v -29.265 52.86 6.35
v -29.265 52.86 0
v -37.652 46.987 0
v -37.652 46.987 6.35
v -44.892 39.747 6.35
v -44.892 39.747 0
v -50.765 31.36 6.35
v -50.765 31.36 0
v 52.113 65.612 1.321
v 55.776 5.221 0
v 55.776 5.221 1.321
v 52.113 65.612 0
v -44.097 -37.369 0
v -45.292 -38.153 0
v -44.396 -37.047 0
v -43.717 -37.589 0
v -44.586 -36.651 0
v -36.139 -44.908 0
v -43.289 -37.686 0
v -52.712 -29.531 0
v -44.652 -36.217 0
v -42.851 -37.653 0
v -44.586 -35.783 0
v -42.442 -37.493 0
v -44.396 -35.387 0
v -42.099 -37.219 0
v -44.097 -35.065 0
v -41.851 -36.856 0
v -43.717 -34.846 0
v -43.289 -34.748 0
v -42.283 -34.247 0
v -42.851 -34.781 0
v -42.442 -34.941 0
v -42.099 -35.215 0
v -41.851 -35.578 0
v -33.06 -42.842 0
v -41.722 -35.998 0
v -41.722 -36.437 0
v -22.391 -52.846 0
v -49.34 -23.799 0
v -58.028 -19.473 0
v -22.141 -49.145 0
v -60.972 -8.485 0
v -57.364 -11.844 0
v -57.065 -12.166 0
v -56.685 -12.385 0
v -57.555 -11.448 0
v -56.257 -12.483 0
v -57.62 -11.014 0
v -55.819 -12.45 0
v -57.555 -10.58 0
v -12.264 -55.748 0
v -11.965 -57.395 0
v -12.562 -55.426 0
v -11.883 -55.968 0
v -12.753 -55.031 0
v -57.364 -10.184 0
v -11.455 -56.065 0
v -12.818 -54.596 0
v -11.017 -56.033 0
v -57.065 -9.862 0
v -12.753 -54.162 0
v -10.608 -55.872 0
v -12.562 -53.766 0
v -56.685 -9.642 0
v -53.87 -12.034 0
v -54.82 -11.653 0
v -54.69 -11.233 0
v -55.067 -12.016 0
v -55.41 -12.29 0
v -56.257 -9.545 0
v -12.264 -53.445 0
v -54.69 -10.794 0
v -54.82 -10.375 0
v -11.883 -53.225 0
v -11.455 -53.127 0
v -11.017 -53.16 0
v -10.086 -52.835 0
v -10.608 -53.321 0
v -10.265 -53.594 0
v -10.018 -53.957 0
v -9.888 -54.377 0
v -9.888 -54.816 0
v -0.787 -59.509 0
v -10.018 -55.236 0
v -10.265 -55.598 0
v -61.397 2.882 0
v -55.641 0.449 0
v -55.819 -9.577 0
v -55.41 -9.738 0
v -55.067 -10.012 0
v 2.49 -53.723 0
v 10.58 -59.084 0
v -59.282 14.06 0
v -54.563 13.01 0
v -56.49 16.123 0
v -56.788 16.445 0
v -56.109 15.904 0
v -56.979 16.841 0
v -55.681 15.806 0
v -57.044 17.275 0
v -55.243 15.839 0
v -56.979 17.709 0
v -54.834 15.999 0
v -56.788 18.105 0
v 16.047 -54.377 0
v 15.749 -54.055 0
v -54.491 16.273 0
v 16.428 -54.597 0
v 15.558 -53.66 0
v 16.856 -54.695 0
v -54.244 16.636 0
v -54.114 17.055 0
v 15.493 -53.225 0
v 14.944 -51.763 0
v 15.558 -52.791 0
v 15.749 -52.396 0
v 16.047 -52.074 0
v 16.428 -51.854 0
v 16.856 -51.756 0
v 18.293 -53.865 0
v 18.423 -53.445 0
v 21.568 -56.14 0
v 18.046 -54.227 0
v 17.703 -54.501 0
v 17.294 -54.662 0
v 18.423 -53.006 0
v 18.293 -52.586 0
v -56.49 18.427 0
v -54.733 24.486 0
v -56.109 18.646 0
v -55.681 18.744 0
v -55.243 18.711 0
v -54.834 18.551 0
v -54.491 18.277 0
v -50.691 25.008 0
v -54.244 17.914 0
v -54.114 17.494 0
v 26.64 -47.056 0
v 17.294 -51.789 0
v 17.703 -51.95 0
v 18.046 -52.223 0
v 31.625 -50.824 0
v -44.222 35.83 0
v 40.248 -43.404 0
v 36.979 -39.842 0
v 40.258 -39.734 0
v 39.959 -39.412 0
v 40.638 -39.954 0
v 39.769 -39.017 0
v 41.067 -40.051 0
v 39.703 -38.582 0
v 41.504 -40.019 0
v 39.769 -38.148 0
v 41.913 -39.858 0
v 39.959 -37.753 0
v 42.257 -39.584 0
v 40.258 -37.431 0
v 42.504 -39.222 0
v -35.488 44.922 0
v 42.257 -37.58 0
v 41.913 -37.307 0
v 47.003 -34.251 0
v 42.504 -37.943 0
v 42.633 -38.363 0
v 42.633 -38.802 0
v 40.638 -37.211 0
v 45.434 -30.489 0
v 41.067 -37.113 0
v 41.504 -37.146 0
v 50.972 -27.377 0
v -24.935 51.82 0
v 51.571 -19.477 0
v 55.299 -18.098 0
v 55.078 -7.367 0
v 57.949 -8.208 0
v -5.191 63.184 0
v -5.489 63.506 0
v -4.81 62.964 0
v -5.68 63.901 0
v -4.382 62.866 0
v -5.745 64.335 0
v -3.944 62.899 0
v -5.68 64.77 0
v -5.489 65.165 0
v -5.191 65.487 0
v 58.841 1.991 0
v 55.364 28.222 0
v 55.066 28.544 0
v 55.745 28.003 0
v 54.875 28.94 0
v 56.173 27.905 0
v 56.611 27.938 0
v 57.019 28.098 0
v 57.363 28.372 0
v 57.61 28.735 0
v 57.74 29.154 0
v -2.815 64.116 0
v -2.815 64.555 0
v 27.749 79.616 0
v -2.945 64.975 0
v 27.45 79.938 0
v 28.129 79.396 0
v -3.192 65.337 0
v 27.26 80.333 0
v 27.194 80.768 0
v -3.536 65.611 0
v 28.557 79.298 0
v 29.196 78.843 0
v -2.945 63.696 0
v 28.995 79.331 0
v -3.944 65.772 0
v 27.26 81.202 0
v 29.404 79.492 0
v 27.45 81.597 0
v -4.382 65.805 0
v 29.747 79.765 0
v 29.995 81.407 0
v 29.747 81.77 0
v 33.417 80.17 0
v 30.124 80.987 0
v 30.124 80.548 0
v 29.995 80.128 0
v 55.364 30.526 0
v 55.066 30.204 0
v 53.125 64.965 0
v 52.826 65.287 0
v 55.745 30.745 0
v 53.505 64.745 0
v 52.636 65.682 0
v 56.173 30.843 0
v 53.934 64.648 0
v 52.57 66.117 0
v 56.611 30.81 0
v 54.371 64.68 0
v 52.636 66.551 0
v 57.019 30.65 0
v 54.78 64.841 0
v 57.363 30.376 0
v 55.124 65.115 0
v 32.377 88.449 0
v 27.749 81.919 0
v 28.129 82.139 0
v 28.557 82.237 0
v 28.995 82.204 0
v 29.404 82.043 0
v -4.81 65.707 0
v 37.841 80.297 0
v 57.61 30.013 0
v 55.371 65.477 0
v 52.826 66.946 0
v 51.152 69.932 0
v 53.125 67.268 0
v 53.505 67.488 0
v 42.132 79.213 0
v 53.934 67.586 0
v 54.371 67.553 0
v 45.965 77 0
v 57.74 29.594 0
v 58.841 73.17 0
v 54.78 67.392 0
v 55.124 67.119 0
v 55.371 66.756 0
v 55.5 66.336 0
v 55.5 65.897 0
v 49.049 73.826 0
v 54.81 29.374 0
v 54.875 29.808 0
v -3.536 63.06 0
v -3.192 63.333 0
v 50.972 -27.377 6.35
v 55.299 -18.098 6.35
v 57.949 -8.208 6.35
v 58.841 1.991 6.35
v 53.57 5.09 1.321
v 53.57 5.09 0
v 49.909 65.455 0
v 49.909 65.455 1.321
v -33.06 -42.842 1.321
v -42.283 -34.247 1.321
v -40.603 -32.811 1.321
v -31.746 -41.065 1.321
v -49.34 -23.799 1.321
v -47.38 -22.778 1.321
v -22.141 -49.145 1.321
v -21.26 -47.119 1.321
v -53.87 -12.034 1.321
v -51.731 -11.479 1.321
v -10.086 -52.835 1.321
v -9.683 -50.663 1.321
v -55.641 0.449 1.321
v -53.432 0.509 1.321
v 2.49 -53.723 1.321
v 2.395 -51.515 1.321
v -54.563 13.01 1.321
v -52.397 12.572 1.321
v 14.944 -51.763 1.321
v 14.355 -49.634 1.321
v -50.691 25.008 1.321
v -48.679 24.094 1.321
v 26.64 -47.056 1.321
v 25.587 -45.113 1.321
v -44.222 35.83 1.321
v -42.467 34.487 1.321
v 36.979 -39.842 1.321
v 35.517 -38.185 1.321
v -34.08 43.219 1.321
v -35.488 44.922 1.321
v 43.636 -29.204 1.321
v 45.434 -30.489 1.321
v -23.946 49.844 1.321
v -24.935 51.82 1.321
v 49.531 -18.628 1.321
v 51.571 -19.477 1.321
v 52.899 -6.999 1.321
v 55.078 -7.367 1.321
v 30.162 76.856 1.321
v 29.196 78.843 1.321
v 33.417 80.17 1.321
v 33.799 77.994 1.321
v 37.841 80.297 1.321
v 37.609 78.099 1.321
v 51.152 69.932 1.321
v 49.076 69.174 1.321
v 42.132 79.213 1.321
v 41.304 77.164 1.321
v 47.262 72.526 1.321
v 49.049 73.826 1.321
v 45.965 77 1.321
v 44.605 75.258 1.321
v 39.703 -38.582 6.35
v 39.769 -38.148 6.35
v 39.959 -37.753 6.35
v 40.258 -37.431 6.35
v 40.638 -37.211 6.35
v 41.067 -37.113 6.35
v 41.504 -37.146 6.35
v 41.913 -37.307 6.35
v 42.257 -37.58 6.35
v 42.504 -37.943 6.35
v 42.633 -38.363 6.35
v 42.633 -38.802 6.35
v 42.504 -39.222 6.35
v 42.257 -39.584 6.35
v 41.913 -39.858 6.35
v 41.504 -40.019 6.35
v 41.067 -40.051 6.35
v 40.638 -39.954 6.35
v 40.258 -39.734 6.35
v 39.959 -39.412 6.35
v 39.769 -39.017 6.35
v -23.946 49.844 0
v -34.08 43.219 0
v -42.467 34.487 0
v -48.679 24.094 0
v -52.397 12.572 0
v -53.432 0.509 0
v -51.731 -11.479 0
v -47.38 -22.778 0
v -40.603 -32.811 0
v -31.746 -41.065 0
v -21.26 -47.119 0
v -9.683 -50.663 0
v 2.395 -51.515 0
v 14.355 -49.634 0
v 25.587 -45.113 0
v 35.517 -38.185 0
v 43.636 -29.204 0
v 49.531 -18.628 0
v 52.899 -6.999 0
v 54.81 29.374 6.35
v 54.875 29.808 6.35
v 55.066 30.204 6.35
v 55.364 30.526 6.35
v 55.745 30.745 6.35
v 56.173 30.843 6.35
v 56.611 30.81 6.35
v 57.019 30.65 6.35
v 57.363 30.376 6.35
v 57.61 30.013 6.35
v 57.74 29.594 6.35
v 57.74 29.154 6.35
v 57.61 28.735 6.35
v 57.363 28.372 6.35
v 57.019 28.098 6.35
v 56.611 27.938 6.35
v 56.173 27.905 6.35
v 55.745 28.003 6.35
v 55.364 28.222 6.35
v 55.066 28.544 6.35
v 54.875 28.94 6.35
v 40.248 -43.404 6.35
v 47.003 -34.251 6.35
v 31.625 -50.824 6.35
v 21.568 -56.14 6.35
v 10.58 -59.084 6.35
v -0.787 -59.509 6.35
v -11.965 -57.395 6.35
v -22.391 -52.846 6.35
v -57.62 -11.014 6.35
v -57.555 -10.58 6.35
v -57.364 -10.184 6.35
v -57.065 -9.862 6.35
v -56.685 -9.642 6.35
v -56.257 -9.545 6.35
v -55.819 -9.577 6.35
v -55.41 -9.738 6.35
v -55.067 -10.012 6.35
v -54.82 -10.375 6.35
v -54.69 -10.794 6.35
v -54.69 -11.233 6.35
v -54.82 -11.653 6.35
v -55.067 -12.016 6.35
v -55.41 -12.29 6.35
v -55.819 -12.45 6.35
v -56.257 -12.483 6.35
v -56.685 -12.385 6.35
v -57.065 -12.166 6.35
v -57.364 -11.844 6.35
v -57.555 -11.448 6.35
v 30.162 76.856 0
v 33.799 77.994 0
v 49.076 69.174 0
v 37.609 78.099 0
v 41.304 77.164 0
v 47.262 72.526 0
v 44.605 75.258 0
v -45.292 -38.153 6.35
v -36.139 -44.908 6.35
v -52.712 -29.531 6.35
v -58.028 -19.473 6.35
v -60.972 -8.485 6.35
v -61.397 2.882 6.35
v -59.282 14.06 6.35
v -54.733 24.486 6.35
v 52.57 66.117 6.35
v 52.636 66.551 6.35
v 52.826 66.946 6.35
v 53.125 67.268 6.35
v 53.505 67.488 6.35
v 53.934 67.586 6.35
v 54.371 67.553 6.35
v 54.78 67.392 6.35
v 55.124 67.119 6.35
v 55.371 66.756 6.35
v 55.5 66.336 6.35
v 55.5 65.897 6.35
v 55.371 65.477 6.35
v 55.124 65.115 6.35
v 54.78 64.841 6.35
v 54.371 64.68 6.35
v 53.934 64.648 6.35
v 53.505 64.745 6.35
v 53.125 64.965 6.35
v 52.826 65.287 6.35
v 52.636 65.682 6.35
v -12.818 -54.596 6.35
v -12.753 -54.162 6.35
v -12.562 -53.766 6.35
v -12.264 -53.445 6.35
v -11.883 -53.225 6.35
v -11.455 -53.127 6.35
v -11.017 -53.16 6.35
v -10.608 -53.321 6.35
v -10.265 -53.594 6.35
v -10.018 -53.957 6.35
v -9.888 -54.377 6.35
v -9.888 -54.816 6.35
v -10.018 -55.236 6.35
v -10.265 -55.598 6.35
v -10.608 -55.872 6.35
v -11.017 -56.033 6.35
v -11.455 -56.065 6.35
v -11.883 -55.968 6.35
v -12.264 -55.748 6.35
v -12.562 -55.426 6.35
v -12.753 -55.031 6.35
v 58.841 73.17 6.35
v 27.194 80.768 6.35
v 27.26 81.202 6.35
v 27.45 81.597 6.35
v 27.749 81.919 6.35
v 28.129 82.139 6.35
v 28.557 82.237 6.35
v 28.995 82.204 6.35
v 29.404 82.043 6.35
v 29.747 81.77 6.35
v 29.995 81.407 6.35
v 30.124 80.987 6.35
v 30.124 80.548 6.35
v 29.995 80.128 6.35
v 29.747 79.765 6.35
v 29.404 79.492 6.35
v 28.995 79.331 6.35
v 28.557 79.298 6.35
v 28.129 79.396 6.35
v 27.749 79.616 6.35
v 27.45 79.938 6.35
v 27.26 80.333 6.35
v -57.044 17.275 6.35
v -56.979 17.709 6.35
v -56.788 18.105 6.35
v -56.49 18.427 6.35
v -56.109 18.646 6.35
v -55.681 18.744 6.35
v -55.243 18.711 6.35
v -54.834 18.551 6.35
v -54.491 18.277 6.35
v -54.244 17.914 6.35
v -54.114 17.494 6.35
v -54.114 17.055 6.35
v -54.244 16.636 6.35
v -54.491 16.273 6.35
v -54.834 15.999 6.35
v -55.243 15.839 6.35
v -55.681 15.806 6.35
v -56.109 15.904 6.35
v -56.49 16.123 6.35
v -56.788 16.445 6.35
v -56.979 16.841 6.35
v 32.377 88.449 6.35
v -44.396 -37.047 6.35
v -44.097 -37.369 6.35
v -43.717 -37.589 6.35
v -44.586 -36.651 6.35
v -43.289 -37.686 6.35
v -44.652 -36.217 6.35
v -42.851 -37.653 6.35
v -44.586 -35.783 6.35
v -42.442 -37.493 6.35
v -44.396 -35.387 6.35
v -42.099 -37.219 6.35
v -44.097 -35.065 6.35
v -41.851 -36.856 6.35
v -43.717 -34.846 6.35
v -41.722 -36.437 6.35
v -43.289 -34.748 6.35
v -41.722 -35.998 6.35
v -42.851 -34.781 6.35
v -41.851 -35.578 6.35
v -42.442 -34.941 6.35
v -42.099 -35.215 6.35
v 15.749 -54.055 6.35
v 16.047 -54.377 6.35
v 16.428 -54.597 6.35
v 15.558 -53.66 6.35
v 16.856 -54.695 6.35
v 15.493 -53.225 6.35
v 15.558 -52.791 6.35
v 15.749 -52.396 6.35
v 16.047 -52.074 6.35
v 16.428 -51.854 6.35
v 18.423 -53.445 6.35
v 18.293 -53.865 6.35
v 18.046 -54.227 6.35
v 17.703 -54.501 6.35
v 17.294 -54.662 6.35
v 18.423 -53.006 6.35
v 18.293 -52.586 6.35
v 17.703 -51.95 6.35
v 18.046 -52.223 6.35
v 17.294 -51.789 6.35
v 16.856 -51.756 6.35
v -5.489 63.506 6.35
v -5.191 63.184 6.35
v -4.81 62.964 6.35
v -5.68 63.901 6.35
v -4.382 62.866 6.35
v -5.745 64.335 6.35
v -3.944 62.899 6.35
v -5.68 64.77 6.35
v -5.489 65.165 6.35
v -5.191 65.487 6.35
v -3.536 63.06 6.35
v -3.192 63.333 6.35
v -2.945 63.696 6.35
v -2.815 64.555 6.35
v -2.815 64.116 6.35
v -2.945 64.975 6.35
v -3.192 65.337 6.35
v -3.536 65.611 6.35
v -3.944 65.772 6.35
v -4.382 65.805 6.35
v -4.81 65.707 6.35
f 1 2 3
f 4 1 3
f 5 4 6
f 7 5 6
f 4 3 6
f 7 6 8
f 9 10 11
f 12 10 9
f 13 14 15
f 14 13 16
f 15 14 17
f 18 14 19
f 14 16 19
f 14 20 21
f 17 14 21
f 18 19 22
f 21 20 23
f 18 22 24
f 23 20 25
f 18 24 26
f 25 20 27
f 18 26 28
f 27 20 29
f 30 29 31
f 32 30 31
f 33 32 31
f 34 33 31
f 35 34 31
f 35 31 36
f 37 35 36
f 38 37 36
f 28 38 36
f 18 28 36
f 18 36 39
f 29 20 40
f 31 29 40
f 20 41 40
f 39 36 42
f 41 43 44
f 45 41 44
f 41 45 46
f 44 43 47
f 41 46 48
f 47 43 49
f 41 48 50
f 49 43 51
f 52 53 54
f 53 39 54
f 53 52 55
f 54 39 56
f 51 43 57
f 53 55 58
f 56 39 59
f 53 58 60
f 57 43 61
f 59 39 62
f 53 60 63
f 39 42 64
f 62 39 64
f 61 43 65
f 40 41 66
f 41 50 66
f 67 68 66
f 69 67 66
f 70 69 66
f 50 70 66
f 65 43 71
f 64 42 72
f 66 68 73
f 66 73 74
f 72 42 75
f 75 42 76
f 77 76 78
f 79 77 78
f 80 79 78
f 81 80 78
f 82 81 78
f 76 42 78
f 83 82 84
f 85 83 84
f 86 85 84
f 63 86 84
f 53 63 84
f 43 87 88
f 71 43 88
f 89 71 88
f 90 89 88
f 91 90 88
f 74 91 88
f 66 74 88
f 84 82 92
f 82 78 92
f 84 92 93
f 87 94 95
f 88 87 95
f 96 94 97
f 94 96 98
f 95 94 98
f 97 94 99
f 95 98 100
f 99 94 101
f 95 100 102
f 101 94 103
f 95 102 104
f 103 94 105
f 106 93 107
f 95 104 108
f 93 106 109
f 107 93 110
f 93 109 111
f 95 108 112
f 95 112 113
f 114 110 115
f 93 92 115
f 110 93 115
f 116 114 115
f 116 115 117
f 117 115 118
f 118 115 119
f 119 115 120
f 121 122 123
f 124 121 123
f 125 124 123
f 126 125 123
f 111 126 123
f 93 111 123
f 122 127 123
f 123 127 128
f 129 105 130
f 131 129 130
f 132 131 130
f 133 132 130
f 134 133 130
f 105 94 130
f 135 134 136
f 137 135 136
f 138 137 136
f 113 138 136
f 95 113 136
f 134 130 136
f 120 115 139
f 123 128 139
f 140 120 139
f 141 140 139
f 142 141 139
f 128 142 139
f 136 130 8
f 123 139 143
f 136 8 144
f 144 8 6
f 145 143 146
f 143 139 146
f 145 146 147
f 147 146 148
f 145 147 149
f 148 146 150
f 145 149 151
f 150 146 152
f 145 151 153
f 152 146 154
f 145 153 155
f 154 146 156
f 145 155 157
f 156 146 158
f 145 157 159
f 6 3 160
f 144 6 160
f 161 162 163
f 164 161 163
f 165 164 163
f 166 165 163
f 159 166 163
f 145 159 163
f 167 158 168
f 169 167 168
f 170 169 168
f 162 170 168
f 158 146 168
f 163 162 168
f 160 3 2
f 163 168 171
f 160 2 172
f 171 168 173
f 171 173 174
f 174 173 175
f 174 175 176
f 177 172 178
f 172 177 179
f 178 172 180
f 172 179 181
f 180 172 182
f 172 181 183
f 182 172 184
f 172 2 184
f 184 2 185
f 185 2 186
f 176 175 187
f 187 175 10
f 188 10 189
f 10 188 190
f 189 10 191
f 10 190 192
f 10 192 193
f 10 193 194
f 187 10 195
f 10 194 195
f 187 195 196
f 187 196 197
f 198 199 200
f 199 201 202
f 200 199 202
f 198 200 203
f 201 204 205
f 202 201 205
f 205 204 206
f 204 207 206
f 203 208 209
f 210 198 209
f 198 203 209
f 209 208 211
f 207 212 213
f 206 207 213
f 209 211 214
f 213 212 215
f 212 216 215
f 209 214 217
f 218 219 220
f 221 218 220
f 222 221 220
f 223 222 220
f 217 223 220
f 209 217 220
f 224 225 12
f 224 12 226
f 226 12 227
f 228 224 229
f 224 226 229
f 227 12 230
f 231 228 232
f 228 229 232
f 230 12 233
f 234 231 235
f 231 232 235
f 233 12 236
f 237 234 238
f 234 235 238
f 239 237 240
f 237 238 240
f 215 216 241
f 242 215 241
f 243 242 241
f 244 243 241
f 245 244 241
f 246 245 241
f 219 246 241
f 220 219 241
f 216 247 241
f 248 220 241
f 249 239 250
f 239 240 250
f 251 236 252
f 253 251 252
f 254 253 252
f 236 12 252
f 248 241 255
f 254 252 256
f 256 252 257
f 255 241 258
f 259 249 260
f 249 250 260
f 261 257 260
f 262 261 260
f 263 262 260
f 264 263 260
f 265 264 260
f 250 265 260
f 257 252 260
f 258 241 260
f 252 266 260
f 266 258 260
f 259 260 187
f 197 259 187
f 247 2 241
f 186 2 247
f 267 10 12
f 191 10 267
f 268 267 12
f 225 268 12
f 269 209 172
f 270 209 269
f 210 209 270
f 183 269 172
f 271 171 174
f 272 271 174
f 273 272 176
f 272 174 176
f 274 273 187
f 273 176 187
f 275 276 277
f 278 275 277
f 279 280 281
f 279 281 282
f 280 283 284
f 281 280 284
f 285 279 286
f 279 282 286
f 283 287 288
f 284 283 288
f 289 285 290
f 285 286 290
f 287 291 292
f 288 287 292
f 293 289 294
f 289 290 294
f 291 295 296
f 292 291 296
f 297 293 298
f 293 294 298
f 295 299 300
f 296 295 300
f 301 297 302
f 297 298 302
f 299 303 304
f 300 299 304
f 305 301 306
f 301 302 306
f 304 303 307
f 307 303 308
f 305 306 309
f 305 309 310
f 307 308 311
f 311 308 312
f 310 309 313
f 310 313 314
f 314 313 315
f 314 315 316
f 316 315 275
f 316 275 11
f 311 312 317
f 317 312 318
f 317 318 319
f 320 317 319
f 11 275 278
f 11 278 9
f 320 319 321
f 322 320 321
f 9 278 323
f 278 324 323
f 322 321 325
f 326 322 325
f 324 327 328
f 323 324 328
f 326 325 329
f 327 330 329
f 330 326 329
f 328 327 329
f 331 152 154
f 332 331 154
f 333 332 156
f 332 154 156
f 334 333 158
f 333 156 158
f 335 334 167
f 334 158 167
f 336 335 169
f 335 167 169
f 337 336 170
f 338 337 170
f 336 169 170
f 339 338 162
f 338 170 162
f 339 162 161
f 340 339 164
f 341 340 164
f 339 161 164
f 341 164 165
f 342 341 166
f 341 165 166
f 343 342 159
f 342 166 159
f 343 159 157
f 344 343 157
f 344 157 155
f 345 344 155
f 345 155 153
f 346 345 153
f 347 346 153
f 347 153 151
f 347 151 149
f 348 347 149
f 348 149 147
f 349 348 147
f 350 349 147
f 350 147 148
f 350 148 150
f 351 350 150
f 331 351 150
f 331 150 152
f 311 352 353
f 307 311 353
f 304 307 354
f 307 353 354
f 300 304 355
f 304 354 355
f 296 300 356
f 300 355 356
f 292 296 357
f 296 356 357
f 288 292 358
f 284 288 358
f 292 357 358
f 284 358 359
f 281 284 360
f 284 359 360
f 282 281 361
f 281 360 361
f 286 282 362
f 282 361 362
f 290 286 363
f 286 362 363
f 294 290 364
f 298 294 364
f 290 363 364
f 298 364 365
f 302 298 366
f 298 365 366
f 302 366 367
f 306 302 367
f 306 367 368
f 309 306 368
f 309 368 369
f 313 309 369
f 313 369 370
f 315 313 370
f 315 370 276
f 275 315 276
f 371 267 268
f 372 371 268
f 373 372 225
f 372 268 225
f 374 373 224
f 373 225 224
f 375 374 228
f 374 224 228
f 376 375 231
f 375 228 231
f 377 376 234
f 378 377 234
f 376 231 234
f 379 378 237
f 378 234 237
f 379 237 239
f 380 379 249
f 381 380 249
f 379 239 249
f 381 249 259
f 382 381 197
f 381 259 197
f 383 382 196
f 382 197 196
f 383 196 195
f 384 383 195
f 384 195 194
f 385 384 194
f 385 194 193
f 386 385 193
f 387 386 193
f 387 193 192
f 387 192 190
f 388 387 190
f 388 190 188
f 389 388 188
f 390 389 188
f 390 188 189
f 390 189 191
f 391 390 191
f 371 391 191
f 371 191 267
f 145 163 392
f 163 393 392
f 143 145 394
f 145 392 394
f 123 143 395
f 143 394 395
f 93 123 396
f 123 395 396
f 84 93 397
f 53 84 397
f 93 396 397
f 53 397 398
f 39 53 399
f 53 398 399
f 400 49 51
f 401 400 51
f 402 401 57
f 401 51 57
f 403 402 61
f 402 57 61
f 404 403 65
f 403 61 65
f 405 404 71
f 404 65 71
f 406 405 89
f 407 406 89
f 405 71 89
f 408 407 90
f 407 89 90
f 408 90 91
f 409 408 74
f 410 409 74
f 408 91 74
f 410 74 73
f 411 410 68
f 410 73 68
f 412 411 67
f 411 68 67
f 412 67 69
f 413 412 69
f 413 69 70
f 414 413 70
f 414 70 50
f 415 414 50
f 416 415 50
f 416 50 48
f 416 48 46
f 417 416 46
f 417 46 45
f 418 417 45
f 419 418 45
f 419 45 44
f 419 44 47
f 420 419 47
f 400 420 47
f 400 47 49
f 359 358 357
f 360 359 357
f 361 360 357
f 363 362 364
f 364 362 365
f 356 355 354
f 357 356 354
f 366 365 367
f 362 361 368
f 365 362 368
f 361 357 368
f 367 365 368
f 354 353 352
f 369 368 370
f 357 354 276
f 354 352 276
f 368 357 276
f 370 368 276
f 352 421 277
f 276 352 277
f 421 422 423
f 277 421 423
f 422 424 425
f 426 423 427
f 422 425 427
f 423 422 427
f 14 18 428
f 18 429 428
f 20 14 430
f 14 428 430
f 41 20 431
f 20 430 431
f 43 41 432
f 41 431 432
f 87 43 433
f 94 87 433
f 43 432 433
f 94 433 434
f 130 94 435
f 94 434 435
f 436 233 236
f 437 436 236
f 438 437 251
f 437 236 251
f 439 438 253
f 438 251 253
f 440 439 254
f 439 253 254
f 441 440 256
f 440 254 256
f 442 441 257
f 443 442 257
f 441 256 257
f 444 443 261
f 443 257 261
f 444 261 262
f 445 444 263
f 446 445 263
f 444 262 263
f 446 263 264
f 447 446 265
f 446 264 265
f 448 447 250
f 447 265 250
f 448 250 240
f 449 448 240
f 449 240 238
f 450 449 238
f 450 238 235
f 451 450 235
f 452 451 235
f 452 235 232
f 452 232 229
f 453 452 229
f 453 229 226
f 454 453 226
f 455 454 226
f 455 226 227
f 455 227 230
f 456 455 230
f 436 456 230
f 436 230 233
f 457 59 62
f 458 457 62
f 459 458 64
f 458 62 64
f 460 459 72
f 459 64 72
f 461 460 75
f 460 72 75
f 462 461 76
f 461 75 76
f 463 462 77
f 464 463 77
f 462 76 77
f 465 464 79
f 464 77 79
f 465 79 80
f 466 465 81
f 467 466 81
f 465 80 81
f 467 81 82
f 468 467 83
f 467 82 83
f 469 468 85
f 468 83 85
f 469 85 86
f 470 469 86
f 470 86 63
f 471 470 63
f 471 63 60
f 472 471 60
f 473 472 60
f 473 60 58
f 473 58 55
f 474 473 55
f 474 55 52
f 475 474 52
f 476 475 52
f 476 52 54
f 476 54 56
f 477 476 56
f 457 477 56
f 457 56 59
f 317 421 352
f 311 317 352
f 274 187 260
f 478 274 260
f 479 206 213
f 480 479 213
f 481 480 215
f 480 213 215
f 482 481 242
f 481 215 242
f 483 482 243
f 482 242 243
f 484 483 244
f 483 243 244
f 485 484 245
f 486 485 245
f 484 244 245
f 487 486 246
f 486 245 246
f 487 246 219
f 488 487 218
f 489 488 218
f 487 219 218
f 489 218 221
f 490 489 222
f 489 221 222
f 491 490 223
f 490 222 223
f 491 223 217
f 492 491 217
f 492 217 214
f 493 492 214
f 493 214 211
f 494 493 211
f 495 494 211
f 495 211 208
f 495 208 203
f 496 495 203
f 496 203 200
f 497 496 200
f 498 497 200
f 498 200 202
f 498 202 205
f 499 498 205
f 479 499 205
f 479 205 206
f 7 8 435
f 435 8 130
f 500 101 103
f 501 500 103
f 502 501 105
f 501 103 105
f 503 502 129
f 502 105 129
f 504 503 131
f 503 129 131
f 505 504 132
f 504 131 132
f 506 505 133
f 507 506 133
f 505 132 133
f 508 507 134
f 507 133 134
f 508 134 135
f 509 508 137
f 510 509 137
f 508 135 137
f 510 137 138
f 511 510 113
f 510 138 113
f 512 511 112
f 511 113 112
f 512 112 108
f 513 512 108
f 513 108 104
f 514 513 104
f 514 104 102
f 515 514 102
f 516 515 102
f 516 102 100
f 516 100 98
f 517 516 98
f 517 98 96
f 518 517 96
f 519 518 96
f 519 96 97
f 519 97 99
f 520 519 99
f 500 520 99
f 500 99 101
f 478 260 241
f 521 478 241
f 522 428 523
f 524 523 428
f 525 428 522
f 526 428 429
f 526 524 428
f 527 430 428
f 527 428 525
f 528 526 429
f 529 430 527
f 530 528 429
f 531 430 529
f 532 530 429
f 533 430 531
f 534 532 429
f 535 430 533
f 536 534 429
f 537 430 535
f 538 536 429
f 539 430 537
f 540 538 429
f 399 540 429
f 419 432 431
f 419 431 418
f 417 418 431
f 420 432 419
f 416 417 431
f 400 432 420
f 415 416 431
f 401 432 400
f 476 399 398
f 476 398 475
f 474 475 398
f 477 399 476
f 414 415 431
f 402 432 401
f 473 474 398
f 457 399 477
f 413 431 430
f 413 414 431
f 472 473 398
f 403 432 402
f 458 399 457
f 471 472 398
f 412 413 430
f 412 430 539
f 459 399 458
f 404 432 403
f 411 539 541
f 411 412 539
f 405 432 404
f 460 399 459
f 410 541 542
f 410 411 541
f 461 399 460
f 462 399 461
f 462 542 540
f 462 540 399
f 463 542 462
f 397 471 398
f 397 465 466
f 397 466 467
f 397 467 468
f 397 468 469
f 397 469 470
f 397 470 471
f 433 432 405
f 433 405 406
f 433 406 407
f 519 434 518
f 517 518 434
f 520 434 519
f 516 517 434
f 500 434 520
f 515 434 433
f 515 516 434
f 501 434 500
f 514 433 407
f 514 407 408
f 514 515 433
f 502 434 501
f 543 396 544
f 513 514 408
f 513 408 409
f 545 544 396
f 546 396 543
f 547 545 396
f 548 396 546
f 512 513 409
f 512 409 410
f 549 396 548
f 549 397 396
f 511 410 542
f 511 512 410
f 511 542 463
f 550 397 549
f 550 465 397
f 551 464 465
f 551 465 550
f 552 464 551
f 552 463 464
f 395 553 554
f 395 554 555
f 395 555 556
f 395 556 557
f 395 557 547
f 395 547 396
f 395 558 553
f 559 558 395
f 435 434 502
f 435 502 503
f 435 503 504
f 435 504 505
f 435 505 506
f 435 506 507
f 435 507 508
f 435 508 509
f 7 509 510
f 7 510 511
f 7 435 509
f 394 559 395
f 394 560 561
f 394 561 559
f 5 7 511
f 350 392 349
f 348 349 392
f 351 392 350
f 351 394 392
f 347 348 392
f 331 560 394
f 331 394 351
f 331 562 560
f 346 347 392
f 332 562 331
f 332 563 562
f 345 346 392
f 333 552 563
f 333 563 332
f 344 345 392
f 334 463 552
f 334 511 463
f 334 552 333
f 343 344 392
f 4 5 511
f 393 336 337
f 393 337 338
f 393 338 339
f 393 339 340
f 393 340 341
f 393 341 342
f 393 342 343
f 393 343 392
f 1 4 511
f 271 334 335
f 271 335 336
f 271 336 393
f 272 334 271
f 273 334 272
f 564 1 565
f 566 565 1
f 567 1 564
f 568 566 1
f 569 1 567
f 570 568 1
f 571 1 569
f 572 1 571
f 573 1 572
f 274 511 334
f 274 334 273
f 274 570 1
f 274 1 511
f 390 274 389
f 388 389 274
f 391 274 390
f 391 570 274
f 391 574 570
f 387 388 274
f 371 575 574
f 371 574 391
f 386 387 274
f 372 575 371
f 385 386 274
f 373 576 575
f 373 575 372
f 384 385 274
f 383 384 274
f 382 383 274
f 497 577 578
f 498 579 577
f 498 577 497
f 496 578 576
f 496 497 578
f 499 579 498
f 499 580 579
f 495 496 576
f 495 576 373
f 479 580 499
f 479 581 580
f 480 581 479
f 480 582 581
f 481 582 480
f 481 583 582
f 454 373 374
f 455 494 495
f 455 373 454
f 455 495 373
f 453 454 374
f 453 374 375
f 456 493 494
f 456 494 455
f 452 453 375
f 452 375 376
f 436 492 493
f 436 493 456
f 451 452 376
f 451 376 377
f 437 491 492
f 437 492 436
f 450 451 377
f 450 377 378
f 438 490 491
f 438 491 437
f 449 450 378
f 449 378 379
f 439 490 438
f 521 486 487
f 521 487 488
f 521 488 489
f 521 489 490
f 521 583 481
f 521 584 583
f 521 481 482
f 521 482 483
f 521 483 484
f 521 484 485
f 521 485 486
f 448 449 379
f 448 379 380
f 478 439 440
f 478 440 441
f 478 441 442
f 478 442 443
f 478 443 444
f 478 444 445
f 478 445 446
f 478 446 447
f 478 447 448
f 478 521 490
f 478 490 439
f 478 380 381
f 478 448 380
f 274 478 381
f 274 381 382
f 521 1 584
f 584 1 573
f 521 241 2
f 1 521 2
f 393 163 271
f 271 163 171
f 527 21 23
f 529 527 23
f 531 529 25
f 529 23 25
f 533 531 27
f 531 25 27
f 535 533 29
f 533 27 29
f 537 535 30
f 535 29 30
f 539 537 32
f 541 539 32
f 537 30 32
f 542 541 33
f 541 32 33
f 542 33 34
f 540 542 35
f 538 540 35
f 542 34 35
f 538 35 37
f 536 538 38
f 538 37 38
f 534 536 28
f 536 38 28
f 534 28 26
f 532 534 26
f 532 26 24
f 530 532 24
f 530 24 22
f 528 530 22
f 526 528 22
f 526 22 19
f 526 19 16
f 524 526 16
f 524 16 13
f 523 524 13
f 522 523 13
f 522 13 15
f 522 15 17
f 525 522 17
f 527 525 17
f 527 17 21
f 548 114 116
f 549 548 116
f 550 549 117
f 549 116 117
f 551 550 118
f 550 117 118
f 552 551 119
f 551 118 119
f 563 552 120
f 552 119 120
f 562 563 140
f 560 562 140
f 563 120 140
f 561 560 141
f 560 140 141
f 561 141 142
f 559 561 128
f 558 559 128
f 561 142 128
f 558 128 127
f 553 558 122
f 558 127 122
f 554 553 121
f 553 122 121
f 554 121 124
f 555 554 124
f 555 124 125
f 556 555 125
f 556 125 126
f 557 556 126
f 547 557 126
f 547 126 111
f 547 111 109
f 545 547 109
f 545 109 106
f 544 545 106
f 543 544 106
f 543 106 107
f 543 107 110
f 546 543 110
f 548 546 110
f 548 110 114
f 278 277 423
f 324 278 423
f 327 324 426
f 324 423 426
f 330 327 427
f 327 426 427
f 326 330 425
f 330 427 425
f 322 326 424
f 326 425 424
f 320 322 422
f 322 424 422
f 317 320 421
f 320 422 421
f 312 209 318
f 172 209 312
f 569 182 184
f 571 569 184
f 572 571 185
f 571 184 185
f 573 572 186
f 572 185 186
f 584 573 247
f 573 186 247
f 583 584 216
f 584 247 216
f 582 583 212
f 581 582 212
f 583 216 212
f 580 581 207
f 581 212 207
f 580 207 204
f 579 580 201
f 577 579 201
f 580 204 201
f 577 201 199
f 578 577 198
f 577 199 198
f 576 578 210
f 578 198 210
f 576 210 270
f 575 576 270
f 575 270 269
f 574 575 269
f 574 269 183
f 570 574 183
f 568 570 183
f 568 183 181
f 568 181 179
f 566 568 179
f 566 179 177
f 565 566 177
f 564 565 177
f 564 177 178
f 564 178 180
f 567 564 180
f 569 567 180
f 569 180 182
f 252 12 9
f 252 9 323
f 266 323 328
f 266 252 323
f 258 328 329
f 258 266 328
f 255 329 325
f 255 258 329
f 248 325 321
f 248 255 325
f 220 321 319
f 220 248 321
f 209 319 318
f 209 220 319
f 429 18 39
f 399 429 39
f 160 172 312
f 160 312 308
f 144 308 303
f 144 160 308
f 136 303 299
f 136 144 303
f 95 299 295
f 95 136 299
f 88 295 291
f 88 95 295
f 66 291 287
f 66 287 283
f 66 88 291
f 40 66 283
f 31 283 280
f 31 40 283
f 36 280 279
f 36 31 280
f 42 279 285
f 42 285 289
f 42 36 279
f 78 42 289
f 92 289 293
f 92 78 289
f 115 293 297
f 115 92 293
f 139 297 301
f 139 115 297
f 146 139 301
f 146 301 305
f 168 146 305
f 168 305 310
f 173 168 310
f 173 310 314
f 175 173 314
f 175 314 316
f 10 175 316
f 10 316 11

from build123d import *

# Parameters (mm, degrees)
BOSS_EXTRUDE2_DEPTH         = 6.35
F_4_CLEARANCE_HOLE1_D       = 2.9464
CUT_EXTRUDE2_DASH_048_DEPTH = 1.3208
FILLET1_R                   = 50.8


with BuildPart() as part:
    # Sketch3 → Boss-Extrude2 (new body)
    with BuildSketch(Plane(origin=(0.103482409, 1.991370524, 0), x_dir=(1, 0, 0), z_dir=(0, 0, 1))):
        with BuildLine():
            Line((58.7375, 0), (58.7375, 71.178534783))
            Line((58.7375, 71.178534783), (32.273669326, 86.457434546))
            Line((32.273669326, 86.457434546), (-29.36875, 50.868167155))
            ThreePointArc((-29.36875, 50.868167155), (-41.53368456, 41.53368456), (-50.868167155, 29.36875))
            Line((-50.868167155, 29.36875), (-80.236917155, -21.499417155))
            Line((-80.236917155, -21.499417155), (21.499417155, -80.236917155))
            Line((21.499417155, -80.236917155), (50.868167155, -29.36875))
            ThreePointArc((50.868167155, -29.36875), (56.736068222, -15.202383662), (58.7375, 0))
        make_face()
    extrude(amount=BOSS_EXTRUDE2_DEPTH)

    # #4 Clearance Hole1 (through all)
    with Locations(Plane.XY.offset(6.35)):
        with Locations((28.667480209, 80.767509471), (54.04362105, 66.116587726), (-4.272114917, 64.335461198), (-55.5710271, 17.274918559), (-56.146896149, -11.01373469), (-43.178667679, -36.217180003), (-11.345017944, -54.596346246), (16.965920195, -53.225438887), (41.176678022, -38.582395037), (56.282847372, 29.37403742)):
            Hole(F_4_CLEARANCE_HOLE1_D / 2)

    # Sketch6 → Cut-Extrude2 - dash 048 (cut)
    with BuildSketch(Plane(origin=(0.103482409, 1.991370524, 0), x_dir=(1, 0, 0), z_dir=(0, 0, 1))):
        with BuildLine():
            Line((55.672086916, 3.229866087), (52.009478425, 63.620294443))
            ThreePointArc((52.009478425, 63.620294443), (44.021350779, 76.247216167), (29.092051971, 76.851676775))
            Line((29.092051971, 76.851676775), (-25.038897376, 49.828374594))
            ThreePointArc((-25.038897376, 49.828374594), (-27.88285, -48.29451286), (55.672086916, 3.229866087))
        make_face()
        with BuildLine():
            Line((53.466162602, 3.099012969), (49.805143409, 63.46323641))
            ThreePointArc((49.805143409, 63.46323641), (42.916450779, 74.33347323), (30.058203233, 74.864137637))
            Line((30.058203233, 74.864137637), (-24.049257344, 47.852561541))
            ThreePointArc((-24.049257344, 47.852561541), (-26.77795, -46.380769923), (53.466162602, 3.099012969))
        make_face(mode=Mode.SUBTRACT)
    extrude(amount=CUT_EXTRUDE2_DASH_048_DEPTH, mode=Mode.SUBTRACT)

    # Fillet1
    fillet1_edges = [part.edges().sort_by_distance(p)[0] for p in [
        (21.602899564, -78.245546631, 3.175),
        (-80.133434745, -19.508046631, 3.175),
    ]]
    fillet(fillet1_edges, radius=FILLET1_R)


solid = part.part
